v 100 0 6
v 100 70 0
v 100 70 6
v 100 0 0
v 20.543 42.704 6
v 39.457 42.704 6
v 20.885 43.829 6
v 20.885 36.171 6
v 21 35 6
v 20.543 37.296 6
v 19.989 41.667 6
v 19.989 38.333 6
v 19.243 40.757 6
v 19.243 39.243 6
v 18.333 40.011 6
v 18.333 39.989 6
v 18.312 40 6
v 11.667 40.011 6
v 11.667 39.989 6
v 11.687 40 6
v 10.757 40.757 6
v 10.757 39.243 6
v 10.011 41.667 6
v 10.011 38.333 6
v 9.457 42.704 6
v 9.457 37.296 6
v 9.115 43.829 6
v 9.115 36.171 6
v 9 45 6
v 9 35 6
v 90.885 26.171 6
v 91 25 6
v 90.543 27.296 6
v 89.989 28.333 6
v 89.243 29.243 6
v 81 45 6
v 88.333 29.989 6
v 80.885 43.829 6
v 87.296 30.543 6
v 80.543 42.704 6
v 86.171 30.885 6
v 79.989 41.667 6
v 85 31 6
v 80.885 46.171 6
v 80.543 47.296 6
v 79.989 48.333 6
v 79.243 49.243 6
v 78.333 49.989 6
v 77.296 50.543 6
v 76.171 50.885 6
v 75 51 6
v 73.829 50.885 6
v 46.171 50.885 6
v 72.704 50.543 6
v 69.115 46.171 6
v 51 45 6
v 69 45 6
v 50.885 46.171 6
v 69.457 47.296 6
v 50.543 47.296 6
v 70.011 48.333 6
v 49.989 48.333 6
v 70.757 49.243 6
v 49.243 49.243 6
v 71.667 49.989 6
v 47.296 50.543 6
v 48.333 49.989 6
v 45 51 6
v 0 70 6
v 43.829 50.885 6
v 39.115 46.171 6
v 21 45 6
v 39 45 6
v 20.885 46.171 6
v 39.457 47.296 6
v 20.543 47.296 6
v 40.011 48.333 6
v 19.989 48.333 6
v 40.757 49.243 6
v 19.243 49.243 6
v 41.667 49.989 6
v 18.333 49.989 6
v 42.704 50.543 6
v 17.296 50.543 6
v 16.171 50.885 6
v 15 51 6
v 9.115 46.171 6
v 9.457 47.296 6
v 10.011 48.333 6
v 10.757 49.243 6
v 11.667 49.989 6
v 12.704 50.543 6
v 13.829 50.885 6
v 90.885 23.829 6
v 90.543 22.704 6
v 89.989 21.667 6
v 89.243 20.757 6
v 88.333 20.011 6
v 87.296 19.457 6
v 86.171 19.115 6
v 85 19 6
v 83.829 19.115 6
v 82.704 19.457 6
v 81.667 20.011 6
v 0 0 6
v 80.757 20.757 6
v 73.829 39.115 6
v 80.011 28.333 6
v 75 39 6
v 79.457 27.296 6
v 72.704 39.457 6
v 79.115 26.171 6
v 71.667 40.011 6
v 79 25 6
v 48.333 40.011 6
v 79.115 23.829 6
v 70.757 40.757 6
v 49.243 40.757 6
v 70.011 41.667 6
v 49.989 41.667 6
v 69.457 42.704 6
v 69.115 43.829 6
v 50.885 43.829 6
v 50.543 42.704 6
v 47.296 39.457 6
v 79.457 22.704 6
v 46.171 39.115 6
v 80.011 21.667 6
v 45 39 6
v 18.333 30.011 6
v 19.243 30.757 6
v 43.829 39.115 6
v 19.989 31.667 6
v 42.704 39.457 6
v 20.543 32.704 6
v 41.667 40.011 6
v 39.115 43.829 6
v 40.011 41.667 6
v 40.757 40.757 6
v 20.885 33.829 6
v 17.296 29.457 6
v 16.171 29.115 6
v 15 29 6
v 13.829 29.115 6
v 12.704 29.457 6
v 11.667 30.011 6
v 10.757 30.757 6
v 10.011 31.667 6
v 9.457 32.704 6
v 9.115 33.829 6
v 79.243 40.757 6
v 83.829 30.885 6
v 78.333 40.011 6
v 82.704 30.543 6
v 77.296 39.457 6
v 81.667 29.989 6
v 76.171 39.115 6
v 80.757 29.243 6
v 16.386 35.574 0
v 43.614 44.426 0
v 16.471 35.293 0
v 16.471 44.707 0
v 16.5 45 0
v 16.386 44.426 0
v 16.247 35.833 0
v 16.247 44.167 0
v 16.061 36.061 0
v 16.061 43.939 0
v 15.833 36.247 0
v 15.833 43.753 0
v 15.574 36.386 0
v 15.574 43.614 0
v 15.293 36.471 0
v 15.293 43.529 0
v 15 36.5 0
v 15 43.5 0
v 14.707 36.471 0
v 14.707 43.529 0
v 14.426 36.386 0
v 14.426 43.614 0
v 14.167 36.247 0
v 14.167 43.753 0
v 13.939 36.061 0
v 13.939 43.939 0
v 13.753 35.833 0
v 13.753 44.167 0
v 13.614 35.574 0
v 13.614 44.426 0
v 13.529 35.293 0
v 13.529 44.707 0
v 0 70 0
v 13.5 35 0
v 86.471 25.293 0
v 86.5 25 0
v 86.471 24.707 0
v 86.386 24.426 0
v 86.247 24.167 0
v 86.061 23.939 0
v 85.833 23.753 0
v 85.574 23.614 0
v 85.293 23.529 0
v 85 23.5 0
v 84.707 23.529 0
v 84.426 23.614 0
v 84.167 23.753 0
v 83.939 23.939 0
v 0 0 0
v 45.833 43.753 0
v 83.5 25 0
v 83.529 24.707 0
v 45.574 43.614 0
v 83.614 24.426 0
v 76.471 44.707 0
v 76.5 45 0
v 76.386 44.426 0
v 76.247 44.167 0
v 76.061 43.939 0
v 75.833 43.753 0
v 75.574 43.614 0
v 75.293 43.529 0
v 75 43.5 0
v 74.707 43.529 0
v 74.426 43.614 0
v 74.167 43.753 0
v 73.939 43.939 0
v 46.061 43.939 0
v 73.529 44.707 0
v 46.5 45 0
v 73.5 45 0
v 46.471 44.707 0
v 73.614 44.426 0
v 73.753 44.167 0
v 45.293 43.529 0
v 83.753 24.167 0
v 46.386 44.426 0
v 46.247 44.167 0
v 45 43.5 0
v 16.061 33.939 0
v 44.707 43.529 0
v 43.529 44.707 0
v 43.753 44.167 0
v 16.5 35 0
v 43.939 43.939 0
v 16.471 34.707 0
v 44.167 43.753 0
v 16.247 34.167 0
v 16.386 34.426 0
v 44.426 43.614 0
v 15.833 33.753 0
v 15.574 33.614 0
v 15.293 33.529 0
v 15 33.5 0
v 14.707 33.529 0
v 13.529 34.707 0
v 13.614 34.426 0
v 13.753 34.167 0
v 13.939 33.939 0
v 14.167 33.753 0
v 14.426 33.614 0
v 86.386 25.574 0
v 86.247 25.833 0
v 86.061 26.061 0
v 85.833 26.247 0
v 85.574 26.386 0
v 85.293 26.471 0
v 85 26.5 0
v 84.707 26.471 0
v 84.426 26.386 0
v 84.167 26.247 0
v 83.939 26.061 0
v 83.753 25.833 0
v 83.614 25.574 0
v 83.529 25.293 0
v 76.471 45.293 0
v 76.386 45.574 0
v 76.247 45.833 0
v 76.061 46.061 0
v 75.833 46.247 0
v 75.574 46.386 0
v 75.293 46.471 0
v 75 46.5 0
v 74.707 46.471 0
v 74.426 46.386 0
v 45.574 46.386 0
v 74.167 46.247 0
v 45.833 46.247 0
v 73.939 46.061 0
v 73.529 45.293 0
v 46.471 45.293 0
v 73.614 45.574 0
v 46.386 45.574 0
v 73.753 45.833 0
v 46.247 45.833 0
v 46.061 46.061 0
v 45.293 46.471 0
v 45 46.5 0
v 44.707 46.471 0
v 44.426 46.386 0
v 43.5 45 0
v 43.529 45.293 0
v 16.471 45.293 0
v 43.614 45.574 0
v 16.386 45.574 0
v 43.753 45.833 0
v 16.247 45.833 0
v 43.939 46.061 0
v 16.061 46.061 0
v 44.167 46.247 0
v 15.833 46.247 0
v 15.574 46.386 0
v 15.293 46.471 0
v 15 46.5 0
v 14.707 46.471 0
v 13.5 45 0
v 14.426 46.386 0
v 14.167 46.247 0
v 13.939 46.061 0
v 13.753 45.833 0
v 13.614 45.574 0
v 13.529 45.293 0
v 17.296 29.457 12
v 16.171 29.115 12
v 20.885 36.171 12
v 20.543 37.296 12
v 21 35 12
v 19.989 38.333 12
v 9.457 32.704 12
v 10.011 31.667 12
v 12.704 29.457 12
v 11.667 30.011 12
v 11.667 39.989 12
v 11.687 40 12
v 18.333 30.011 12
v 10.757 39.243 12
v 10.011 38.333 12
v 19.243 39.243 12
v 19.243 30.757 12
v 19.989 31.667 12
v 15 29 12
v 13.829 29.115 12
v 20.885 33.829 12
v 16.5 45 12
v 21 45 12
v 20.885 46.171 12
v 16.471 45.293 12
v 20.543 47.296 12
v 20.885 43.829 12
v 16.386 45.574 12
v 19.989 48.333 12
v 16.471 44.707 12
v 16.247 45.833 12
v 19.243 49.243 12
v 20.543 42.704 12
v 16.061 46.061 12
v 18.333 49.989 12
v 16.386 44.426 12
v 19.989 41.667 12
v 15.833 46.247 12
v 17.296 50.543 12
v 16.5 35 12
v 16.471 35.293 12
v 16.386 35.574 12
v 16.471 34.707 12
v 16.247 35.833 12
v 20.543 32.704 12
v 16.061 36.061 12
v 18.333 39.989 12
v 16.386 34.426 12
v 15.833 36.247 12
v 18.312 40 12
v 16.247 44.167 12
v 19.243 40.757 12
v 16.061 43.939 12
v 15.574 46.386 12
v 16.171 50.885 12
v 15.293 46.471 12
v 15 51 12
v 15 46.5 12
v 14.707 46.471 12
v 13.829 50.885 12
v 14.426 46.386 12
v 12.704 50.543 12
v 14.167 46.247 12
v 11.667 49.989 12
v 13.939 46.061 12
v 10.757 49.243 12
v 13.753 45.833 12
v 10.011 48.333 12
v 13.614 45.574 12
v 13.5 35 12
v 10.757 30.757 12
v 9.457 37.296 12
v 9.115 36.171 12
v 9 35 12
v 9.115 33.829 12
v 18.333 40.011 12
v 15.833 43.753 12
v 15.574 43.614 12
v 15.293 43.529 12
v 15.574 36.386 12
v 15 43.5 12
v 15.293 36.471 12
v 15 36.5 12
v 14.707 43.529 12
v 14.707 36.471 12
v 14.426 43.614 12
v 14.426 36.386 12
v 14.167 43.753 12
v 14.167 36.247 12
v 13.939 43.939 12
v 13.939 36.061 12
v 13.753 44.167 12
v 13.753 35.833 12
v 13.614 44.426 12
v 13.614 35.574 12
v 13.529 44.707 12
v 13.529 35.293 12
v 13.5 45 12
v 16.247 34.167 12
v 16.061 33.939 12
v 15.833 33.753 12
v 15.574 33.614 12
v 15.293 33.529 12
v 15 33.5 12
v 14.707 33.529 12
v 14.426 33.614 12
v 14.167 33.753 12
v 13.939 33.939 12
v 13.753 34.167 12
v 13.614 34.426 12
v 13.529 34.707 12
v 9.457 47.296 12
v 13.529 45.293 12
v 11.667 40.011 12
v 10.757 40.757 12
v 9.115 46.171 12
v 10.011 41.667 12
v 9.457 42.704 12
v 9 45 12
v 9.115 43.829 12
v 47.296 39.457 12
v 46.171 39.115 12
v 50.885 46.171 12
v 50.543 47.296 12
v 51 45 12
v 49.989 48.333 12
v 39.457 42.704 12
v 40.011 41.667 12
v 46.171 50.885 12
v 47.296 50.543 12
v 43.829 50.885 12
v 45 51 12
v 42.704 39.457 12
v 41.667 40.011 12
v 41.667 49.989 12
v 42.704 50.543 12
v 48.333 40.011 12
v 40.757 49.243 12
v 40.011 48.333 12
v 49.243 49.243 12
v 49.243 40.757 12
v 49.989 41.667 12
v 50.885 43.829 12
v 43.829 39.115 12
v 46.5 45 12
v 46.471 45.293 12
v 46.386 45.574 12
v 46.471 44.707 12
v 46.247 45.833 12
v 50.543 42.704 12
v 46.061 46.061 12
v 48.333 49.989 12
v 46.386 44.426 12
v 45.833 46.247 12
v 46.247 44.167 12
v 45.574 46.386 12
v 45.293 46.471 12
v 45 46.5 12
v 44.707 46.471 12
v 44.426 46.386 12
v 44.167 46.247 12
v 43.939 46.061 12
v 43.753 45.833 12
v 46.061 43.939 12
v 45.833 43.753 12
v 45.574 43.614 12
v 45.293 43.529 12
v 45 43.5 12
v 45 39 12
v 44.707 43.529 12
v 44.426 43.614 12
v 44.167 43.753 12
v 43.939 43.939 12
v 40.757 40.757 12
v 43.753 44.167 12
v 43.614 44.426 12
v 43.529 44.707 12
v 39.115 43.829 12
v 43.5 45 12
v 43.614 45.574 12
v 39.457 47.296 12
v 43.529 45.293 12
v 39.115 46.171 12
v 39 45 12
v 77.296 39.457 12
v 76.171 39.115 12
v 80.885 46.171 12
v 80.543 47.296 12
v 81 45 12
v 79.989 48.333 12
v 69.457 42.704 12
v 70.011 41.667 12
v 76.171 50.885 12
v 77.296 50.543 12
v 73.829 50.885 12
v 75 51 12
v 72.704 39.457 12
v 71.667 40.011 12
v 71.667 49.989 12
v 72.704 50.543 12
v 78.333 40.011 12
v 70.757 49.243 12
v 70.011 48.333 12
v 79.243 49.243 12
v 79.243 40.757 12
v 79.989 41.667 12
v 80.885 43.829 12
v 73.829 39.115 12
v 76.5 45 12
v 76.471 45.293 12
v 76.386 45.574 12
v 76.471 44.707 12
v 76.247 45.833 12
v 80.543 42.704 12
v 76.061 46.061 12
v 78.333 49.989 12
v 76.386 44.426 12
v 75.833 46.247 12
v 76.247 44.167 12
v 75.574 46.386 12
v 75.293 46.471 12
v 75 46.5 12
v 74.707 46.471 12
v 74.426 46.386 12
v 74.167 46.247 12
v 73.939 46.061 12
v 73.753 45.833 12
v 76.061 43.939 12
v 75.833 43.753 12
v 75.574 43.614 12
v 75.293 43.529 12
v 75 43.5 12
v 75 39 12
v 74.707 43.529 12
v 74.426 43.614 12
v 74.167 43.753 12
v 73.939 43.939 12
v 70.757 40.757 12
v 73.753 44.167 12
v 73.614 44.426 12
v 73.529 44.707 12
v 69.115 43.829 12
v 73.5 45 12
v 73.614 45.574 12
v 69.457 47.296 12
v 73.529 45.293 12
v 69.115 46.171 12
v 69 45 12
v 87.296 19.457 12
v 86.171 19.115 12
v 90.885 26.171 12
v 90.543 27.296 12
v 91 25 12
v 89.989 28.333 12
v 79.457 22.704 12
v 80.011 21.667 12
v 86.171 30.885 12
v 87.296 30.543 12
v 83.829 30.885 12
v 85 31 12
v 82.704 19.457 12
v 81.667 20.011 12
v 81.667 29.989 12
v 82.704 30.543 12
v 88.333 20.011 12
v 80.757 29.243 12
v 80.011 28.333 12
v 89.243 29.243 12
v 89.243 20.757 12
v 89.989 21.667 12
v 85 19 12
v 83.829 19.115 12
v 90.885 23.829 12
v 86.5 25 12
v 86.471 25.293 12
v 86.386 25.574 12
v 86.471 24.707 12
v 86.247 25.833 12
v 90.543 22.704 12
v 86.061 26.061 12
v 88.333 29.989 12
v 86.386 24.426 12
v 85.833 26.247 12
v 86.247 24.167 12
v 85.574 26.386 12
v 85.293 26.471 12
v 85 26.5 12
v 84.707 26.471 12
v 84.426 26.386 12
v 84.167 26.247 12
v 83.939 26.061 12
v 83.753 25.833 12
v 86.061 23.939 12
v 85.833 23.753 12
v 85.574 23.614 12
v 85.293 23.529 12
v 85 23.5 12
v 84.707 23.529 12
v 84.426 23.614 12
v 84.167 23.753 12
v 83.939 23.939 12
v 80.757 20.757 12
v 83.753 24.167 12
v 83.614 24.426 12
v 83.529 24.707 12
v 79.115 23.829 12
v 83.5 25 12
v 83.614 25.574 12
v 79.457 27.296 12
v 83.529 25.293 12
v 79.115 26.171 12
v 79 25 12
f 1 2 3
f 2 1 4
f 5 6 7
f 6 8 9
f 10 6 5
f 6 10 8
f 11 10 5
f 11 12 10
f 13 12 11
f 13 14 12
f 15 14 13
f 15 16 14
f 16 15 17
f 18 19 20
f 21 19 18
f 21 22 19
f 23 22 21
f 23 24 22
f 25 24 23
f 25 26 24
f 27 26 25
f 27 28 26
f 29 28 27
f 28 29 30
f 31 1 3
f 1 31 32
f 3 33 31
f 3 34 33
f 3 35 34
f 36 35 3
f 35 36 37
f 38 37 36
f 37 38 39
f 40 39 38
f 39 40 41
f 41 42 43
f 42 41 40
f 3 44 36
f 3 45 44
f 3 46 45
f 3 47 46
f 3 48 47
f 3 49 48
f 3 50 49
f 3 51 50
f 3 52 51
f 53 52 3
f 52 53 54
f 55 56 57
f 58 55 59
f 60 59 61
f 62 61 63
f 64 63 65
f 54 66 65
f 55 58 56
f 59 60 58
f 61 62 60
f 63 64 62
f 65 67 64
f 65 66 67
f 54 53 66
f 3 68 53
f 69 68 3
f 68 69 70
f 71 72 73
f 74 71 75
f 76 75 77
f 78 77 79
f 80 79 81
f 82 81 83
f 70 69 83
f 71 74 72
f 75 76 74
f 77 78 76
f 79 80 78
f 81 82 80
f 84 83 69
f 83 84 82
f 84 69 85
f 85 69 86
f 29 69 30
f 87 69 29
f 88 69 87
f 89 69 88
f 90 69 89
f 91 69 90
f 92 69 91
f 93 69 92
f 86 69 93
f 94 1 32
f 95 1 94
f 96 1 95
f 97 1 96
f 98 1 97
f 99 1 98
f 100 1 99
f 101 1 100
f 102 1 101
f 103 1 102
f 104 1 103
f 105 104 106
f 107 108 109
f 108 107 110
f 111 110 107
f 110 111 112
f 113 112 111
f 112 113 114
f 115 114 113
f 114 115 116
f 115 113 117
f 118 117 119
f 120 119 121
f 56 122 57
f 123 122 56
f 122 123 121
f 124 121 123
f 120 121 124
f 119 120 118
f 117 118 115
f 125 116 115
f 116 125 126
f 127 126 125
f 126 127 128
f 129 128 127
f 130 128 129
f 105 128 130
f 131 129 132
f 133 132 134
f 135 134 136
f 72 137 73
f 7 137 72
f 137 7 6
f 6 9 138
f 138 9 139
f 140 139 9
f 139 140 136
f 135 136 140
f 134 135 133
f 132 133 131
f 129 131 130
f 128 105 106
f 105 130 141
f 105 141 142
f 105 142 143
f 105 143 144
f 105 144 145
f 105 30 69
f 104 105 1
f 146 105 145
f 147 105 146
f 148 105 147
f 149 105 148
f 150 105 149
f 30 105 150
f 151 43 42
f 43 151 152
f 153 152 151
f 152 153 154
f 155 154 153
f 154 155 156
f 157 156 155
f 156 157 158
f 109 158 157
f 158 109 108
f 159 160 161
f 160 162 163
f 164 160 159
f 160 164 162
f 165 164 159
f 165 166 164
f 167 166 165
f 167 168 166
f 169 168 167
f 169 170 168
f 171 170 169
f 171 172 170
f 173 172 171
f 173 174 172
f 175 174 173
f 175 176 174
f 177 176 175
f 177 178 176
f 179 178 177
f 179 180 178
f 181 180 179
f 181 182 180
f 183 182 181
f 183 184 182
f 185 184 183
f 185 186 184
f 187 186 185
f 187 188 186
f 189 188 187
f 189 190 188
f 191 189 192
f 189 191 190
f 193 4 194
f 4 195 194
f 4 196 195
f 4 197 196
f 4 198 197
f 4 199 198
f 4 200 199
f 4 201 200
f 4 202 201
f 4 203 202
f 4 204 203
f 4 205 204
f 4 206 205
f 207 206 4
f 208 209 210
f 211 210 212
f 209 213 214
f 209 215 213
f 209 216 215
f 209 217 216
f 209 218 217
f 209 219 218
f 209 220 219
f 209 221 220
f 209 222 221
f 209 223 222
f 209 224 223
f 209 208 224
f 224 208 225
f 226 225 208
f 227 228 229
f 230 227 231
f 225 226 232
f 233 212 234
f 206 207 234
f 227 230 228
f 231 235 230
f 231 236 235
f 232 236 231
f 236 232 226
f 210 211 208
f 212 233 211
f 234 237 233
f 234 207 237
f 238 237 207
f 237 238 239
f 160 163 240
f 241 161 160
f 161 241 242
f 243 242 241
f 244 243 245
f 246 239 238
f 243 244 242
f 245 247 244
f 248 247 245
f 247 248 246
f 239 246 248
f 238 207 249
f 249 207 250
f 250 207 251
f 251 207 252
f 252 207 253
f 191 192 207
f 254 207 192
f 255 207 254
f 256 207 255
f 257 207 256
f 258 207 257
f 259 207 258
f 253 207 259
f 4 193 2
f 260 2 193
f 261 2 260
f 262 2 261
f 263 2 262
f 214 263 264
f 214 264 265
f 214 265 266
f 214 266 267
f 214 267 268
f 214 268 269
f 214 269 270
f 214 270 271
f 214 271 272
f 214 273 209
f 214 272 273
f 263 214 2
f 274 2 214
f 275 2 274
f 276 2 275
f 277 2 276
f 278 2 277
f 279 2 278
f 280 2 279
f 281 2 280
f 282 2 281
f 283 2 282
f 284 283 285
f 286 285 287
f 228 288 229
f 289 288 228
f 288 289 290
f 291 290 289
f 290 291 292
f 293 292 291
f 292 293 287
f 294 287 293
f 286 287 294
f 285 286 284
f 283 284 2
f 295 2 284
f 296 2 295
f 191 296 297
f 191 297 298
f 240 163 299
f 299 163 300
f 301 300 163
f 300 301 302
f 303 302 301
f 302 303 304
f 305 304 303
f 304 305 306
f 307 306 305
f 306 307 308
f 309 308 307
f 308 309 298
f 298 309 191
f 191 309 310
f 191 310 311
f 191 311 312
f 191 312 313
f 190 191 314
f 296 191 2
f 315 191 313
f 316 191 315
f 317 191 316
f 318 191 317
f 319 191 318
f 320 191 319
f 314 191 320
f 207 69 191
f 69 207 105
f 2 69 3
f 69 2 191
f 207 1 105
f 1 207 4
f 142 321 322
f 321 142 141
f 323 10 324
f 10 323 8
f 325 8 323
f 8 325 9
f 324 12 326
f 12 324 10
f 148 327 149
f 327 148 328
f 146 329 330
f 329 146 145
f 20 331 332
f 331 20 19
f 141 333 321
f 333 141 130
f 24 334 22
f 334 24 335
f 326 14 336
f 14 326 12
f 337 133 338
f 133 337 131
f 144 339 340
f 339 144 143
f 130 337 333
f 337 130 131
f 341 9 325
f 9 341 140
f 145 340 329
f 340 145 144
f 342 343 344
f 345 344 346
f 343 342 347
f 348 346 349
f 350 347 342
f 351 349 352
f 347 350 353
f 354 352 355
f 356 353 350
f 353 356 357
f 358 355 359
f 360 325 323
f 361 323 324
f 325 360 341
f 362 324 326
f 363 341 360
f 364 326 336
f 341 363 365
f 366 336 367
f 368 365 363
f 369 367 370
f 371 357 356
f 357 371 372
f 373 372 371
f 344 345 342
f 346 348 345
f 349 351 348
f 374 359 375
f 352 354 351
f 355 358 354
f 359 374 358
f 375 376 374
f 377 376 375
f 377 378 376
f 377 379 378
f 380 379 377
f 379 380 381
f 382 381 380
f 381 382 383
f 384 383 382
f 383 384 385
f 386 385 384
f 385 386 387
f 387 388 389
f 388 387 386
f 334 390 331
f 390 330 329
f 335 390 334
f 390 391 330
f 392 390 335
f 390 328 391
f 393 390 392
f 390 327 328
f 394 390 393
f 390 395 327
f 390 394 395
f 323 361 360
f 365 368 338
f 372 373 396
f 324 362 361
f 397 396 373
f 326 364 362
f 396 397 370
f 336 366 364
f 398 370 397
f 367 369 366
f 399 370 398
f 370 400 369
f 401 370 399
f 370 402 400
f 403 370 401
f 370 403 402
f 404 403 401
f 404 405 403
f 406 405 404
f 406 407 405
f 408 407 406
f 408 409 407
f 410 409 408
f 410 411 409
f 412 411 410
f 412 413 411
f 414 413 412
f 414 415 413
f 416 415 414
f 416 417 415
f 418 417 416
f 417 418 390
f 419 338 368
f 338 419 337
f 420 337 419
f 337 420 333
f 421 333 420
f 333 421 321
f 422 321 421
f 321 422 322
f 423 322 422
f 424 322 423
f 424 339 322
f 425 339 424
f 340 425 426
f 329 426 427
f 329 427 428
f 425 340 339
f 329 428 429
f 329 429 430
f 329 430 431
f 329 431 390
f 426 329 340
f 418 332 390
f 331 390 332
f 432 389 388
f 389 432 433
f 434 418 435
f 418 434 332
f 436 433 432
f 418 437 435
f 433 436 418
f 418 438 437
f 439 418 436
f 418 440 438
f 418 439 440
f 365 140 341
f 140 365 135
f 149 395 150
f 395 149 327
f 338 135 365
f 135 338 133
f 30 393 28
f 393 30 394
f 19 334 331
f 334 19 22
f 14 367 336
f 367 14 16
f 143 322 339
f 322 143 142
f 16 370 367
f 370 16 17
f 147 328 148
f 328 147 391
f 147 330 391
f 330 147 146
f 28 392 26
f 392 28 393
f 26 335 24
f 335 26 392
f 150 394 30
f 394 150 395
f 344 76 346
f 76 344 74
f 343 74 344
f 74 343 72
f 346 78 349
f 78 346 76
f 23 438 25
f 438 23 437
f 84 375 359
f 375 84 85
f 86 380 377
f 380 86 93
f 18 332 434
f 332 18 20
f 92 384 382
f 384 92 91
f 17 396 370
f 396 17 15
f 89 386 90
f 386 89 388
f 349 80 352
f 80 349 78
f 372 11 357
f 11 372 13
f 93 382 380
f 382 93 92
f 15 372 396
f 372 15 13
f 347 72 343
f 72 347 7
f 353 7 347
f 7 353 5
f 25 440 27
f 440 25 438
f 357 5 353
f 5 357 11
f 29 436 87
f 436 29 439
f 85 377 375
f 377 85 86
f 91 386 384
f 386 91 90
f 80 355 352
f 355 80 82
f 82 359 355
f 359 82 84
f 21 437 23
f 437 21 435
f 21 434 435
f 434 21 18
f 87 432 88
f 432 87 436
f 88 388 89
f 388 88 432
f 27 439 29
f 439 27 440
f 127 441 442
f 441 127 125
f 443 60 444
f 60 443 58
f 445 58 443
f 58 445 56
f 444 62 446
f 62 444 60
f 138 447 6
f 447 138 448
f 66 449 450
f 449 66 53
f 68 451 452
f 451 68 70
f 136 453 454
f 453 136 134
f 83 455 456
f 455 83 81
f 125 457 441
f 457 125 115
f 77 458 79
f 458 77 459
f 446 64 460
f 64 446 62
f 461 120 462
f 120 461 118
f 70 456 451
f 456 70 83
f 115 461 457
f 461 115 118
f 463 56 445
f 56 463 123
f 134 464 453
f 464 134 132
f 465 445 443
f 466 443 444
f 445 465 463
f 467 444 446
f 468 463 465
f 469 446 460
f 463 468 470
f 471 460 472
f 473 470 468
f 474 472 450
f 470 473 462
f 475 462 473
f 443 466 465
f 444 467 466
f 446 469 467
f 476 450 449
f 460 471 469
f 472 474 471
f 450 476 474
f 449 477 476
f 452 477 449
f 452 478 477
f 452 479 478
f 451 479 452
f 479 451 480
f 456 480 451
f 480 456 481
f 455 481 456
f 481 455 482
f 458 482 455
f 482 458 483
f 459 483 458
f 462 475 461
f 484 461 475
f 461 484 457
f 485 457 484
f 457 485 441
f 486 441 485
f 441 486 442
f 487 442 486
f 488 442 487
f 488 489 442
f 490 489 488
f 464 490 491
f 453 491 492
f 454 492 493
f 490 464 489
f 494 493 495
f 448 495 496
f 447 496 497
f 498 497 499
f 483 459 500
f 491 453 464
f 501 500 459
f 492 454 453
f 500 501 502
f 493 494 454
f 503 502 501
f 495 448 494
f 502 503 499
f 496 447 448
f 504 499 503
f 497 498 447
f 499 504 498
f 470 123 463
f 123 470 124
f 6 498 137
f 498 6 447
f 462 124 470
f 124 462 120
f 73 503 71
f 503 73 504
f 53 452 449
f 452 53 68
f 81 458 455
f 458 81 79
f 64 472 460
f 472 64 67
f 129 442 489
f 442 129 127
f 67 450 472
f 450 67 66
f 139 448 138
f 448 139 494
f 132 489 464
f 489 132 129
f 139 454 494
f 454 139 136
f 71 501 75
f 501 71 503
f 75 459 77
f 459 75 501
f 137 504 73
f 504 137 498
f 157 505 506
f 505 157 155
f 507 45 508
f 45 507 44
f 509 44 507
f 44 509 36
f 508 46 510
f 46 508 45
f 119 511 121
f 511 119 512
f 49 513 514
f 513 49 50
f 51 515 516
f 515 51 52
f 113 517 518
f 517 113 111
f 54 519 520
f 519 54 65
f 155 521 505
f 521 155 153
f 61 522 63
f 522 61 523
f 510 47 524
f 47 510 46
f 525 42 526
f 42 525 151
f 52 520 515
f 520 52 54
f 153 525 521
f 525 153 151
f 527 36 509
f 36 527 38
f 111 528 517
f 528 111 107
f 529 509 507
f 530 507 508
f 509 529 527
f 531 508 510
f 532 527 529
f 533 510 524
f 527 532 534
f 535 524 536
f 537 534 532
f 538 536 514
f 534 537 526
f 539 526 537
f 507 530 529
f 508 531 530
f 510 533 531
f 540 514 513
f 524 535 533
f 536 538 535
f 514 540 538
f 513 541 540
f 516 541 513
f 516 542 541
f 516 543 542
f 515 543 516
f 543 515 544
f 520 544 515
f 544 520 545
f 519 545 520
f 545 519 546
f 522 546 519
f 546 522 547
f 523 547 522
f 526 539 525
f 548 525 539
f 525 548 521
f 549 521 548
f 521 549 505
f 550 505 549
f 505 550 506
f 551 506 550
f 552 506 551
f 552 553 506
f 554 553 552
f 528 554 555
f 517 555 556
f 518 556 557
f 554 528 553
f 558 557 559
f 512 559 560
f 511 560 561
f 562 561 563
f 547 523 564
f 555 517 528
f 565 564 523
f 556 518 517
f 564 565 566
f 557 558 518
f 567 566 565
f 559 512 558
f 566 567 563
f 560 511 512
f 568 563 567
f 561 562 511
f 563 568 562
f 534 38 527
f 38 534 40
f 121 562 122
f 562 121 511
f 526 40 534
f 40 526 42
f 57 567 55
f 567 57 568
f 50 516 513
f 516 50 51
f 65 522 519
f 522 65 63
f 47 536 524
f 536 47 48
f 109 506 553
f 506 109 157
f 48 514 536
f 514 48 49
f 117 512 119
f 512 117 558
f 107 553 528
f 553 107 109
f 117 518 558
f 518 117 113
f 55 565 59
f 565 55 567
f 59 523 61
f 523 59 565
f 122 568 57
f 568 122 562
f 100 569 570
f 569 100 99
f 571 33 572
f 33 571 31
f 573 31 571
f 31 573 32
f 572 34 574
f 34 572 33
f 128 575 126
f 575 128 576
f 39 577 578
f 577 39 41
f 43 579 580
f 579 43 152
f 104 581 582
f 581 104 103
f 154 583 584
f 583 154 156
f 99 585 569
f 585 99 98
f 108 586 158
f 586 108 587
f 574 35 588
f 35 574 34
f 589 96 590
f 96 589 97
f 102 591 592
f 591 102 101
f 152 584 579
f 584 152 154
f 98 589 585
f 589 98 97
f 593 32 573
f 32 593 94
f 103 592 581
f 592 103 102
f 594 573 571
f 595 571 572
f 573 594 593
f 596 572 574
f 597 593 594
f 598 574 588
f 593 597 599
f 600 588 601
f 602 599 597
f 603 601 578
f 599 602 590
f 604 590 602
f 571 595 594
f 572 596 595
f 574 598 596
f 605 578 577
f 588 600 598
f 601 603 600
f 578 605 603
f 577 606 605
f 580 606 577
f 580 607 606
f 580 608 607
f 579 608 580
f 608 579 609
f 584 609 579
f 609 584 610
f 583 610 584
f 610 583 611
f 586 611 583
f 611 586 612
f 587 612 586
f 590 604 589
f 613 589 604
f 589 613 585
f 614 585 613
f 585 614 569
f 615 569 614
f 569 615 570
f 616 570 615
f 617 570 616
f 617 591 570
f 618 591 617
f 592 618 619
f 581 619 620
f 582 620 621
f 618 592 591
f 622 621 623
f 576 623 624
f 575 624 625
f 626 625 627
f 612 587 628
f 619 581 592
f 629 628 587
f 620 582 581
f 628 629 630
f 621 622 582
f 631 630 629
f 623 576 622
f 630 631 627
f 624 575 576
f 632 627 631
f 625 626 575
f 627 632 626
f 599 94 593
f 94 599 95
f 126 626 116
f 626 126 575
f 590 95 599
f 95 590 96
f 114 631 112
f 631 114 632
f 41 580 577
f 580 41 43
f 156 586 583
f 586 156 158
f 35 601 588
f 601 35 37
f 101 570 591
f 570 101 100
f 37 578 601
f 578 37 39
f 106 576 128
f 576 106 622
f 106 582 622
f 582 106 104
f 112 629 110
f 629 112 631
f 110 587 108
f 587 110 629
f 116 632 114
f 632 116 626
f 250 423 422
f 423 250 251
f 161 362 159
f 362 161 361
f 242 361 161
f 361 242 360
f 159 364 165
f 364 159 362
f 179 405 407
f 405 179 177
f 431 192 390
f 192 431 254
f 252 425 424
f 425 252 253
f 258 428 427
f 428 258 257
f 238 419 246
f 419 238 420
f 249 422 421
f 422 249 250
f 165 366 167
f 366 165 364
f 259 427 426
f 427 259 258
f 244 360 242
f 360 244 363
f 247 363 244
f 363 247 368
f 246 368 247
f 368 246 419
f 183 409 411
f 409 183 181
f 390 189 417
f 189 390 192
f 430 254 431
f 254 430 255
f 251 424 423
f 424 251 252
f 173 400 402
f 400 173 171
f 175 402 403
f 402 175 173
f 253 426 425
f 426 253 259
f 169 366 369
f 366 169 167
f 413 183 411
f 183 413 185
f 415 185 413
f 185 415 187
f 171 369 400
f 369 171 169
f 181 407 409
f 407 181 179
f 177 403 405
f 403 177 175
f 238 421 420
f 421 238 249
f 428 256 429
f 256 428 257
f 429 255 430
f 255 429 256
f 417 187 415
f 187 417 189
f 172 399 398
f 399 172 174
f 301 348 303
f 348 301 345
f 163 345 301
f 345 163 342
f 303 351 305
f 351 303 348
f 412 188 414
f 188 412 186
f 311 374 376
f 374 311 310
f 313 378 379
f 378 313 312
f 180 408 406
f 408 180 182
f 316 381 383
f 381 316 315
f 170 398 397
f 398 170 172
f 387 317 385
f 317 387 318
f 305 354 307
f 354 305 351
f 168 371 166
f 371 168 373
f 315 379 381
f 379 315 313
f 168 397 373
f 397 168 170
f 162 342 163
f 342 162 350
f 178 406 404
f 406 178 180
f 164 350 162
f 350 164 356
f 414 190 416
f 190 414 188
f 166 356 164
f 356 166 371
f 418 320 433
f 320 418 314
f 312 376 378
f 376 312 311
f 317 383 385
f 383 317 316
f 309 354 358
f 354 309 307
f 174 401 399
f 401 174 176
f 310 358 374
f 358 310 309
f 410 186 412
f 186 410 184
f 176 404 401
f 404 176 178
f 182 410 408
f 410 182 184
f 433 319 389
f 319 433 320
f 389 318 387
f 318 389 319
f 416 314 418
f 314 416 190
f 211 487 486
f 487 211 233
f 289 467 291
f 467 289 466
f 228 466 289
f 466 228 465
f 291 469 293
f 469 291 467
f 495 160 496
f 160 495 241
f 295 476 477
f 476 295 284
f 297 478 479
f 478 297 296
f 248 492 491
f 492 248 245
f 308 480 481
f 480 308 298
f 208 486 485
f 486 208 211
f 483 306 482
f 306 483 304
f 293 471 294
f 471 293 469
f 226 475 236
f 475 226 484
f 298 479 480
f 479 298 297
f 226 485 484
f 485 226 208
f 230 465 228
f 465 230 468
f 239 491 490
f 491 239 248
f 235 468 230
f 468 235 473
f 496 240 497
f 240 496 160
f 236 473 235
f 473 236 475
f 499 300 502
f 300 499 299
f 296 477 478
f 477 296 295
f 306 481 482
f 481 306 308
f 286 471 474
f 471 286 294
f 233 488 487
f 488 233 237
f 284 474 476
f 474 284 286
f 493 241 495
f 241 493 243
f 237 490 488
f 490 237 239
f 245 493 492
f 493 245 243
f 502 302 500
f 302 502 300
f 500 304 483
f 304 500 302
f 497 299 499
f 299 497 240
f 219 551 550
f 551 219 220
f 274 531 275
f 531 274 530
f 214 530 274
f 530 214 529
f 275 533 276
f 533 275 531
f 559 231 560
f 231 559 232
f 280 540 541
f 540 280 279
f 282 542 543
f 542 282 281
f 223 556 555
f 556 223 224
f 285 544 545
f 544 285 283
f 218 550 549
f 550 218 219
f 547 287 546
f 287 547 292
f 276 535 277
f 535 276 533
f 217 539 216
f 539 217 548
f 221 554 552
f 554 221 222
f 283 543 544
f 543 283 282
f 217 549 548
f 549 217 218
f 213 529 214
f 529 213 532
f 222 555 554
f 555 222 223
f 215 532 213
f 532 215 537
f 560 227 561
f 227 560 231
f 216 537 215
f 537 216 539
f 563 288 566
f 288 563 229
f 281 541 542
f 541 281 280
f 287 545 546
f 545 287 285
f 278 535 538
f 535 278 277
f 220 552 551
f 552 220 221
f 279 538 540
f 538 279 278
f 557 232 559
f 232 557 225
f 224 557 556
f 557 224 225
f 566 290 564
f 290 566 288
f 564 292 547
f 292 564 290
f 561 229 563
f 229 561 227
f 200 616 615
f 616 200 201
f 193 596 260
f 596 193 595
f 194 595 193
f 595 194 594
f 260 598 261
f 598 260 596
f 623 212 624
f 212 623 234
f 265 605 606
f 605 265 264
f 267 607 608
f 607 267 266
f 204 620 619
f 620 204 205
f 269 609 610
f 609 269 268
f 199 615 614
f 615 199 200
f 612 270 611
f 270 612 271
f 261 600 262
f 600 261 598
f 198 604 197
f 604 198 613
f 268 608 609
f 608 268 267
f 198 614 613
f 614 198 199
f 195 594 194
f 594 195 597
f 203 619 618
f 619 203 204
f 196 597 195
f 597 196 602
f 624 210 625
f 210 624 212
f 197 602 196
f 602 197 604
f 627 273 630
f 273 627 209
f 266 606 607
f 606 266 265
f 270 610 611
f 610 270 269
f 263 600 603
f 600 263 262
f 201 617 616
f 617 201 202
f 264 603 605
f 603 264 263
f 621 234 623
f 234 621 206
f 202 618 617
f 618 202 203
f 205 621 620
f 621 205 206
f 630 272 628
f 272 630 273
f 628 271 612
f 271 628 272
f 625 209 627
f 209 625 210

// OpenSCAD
$fn = 32;

// ----------------------------------------------------------------------
// Boss field: plate with bosses at given coordinates
// ----------------------------------------------------------------------

// --- parameters (mm) ---
plate_l = 100;            // plate length, X
plate_w = 70;             // plate width, Y
plate_t = 6;              // plate thickness, Z
boss_d = 12;              // boss diameter
boss_h = 6;               // boss height above the plate
bore_d = 3;               // boss bore
fit_tol = 0.1;            // tolerance for press fits, mm
free_tol = 0.5;           // tolerance for clearance fits, mm

total_h = plate_t + boss_h;  // overall height

difference() {
  union() {
    cube([plate_l, plate_w, plate_t]);
    translate([15, 35, plate_t]) cylinder(h = boss_h, d = boss_d);
    translate([15, 45, plate_t]) cylinder(h = boss_h, d = boss_d);
    translate([45, 45, plate_t]) cylinder(h = boss_h, d = boss_d);
    translate([75, 45, plate_t]) cylinder(h = boss_h, d = boss_d);
    translate([85, 25, plate_t]) cylinder(h = boss_h, d = boss_d);
  }
  translate([15, 35, -1]) cylinder(h = total_h + 2, d = bore_d);
  translate([15, 45, -1]) cylinder(h = total_h + 2, d = bore_d);
  translate([45, 45, -1]) cylinder(h = total_h + 2, d = bore_d);
  translate([75, 45, -1]) cylinder(h = total_h + 2, d = bore_d);
  translate([85, 25, -1]) cylinder(h = total_h + 2, d = bore_d);
}
